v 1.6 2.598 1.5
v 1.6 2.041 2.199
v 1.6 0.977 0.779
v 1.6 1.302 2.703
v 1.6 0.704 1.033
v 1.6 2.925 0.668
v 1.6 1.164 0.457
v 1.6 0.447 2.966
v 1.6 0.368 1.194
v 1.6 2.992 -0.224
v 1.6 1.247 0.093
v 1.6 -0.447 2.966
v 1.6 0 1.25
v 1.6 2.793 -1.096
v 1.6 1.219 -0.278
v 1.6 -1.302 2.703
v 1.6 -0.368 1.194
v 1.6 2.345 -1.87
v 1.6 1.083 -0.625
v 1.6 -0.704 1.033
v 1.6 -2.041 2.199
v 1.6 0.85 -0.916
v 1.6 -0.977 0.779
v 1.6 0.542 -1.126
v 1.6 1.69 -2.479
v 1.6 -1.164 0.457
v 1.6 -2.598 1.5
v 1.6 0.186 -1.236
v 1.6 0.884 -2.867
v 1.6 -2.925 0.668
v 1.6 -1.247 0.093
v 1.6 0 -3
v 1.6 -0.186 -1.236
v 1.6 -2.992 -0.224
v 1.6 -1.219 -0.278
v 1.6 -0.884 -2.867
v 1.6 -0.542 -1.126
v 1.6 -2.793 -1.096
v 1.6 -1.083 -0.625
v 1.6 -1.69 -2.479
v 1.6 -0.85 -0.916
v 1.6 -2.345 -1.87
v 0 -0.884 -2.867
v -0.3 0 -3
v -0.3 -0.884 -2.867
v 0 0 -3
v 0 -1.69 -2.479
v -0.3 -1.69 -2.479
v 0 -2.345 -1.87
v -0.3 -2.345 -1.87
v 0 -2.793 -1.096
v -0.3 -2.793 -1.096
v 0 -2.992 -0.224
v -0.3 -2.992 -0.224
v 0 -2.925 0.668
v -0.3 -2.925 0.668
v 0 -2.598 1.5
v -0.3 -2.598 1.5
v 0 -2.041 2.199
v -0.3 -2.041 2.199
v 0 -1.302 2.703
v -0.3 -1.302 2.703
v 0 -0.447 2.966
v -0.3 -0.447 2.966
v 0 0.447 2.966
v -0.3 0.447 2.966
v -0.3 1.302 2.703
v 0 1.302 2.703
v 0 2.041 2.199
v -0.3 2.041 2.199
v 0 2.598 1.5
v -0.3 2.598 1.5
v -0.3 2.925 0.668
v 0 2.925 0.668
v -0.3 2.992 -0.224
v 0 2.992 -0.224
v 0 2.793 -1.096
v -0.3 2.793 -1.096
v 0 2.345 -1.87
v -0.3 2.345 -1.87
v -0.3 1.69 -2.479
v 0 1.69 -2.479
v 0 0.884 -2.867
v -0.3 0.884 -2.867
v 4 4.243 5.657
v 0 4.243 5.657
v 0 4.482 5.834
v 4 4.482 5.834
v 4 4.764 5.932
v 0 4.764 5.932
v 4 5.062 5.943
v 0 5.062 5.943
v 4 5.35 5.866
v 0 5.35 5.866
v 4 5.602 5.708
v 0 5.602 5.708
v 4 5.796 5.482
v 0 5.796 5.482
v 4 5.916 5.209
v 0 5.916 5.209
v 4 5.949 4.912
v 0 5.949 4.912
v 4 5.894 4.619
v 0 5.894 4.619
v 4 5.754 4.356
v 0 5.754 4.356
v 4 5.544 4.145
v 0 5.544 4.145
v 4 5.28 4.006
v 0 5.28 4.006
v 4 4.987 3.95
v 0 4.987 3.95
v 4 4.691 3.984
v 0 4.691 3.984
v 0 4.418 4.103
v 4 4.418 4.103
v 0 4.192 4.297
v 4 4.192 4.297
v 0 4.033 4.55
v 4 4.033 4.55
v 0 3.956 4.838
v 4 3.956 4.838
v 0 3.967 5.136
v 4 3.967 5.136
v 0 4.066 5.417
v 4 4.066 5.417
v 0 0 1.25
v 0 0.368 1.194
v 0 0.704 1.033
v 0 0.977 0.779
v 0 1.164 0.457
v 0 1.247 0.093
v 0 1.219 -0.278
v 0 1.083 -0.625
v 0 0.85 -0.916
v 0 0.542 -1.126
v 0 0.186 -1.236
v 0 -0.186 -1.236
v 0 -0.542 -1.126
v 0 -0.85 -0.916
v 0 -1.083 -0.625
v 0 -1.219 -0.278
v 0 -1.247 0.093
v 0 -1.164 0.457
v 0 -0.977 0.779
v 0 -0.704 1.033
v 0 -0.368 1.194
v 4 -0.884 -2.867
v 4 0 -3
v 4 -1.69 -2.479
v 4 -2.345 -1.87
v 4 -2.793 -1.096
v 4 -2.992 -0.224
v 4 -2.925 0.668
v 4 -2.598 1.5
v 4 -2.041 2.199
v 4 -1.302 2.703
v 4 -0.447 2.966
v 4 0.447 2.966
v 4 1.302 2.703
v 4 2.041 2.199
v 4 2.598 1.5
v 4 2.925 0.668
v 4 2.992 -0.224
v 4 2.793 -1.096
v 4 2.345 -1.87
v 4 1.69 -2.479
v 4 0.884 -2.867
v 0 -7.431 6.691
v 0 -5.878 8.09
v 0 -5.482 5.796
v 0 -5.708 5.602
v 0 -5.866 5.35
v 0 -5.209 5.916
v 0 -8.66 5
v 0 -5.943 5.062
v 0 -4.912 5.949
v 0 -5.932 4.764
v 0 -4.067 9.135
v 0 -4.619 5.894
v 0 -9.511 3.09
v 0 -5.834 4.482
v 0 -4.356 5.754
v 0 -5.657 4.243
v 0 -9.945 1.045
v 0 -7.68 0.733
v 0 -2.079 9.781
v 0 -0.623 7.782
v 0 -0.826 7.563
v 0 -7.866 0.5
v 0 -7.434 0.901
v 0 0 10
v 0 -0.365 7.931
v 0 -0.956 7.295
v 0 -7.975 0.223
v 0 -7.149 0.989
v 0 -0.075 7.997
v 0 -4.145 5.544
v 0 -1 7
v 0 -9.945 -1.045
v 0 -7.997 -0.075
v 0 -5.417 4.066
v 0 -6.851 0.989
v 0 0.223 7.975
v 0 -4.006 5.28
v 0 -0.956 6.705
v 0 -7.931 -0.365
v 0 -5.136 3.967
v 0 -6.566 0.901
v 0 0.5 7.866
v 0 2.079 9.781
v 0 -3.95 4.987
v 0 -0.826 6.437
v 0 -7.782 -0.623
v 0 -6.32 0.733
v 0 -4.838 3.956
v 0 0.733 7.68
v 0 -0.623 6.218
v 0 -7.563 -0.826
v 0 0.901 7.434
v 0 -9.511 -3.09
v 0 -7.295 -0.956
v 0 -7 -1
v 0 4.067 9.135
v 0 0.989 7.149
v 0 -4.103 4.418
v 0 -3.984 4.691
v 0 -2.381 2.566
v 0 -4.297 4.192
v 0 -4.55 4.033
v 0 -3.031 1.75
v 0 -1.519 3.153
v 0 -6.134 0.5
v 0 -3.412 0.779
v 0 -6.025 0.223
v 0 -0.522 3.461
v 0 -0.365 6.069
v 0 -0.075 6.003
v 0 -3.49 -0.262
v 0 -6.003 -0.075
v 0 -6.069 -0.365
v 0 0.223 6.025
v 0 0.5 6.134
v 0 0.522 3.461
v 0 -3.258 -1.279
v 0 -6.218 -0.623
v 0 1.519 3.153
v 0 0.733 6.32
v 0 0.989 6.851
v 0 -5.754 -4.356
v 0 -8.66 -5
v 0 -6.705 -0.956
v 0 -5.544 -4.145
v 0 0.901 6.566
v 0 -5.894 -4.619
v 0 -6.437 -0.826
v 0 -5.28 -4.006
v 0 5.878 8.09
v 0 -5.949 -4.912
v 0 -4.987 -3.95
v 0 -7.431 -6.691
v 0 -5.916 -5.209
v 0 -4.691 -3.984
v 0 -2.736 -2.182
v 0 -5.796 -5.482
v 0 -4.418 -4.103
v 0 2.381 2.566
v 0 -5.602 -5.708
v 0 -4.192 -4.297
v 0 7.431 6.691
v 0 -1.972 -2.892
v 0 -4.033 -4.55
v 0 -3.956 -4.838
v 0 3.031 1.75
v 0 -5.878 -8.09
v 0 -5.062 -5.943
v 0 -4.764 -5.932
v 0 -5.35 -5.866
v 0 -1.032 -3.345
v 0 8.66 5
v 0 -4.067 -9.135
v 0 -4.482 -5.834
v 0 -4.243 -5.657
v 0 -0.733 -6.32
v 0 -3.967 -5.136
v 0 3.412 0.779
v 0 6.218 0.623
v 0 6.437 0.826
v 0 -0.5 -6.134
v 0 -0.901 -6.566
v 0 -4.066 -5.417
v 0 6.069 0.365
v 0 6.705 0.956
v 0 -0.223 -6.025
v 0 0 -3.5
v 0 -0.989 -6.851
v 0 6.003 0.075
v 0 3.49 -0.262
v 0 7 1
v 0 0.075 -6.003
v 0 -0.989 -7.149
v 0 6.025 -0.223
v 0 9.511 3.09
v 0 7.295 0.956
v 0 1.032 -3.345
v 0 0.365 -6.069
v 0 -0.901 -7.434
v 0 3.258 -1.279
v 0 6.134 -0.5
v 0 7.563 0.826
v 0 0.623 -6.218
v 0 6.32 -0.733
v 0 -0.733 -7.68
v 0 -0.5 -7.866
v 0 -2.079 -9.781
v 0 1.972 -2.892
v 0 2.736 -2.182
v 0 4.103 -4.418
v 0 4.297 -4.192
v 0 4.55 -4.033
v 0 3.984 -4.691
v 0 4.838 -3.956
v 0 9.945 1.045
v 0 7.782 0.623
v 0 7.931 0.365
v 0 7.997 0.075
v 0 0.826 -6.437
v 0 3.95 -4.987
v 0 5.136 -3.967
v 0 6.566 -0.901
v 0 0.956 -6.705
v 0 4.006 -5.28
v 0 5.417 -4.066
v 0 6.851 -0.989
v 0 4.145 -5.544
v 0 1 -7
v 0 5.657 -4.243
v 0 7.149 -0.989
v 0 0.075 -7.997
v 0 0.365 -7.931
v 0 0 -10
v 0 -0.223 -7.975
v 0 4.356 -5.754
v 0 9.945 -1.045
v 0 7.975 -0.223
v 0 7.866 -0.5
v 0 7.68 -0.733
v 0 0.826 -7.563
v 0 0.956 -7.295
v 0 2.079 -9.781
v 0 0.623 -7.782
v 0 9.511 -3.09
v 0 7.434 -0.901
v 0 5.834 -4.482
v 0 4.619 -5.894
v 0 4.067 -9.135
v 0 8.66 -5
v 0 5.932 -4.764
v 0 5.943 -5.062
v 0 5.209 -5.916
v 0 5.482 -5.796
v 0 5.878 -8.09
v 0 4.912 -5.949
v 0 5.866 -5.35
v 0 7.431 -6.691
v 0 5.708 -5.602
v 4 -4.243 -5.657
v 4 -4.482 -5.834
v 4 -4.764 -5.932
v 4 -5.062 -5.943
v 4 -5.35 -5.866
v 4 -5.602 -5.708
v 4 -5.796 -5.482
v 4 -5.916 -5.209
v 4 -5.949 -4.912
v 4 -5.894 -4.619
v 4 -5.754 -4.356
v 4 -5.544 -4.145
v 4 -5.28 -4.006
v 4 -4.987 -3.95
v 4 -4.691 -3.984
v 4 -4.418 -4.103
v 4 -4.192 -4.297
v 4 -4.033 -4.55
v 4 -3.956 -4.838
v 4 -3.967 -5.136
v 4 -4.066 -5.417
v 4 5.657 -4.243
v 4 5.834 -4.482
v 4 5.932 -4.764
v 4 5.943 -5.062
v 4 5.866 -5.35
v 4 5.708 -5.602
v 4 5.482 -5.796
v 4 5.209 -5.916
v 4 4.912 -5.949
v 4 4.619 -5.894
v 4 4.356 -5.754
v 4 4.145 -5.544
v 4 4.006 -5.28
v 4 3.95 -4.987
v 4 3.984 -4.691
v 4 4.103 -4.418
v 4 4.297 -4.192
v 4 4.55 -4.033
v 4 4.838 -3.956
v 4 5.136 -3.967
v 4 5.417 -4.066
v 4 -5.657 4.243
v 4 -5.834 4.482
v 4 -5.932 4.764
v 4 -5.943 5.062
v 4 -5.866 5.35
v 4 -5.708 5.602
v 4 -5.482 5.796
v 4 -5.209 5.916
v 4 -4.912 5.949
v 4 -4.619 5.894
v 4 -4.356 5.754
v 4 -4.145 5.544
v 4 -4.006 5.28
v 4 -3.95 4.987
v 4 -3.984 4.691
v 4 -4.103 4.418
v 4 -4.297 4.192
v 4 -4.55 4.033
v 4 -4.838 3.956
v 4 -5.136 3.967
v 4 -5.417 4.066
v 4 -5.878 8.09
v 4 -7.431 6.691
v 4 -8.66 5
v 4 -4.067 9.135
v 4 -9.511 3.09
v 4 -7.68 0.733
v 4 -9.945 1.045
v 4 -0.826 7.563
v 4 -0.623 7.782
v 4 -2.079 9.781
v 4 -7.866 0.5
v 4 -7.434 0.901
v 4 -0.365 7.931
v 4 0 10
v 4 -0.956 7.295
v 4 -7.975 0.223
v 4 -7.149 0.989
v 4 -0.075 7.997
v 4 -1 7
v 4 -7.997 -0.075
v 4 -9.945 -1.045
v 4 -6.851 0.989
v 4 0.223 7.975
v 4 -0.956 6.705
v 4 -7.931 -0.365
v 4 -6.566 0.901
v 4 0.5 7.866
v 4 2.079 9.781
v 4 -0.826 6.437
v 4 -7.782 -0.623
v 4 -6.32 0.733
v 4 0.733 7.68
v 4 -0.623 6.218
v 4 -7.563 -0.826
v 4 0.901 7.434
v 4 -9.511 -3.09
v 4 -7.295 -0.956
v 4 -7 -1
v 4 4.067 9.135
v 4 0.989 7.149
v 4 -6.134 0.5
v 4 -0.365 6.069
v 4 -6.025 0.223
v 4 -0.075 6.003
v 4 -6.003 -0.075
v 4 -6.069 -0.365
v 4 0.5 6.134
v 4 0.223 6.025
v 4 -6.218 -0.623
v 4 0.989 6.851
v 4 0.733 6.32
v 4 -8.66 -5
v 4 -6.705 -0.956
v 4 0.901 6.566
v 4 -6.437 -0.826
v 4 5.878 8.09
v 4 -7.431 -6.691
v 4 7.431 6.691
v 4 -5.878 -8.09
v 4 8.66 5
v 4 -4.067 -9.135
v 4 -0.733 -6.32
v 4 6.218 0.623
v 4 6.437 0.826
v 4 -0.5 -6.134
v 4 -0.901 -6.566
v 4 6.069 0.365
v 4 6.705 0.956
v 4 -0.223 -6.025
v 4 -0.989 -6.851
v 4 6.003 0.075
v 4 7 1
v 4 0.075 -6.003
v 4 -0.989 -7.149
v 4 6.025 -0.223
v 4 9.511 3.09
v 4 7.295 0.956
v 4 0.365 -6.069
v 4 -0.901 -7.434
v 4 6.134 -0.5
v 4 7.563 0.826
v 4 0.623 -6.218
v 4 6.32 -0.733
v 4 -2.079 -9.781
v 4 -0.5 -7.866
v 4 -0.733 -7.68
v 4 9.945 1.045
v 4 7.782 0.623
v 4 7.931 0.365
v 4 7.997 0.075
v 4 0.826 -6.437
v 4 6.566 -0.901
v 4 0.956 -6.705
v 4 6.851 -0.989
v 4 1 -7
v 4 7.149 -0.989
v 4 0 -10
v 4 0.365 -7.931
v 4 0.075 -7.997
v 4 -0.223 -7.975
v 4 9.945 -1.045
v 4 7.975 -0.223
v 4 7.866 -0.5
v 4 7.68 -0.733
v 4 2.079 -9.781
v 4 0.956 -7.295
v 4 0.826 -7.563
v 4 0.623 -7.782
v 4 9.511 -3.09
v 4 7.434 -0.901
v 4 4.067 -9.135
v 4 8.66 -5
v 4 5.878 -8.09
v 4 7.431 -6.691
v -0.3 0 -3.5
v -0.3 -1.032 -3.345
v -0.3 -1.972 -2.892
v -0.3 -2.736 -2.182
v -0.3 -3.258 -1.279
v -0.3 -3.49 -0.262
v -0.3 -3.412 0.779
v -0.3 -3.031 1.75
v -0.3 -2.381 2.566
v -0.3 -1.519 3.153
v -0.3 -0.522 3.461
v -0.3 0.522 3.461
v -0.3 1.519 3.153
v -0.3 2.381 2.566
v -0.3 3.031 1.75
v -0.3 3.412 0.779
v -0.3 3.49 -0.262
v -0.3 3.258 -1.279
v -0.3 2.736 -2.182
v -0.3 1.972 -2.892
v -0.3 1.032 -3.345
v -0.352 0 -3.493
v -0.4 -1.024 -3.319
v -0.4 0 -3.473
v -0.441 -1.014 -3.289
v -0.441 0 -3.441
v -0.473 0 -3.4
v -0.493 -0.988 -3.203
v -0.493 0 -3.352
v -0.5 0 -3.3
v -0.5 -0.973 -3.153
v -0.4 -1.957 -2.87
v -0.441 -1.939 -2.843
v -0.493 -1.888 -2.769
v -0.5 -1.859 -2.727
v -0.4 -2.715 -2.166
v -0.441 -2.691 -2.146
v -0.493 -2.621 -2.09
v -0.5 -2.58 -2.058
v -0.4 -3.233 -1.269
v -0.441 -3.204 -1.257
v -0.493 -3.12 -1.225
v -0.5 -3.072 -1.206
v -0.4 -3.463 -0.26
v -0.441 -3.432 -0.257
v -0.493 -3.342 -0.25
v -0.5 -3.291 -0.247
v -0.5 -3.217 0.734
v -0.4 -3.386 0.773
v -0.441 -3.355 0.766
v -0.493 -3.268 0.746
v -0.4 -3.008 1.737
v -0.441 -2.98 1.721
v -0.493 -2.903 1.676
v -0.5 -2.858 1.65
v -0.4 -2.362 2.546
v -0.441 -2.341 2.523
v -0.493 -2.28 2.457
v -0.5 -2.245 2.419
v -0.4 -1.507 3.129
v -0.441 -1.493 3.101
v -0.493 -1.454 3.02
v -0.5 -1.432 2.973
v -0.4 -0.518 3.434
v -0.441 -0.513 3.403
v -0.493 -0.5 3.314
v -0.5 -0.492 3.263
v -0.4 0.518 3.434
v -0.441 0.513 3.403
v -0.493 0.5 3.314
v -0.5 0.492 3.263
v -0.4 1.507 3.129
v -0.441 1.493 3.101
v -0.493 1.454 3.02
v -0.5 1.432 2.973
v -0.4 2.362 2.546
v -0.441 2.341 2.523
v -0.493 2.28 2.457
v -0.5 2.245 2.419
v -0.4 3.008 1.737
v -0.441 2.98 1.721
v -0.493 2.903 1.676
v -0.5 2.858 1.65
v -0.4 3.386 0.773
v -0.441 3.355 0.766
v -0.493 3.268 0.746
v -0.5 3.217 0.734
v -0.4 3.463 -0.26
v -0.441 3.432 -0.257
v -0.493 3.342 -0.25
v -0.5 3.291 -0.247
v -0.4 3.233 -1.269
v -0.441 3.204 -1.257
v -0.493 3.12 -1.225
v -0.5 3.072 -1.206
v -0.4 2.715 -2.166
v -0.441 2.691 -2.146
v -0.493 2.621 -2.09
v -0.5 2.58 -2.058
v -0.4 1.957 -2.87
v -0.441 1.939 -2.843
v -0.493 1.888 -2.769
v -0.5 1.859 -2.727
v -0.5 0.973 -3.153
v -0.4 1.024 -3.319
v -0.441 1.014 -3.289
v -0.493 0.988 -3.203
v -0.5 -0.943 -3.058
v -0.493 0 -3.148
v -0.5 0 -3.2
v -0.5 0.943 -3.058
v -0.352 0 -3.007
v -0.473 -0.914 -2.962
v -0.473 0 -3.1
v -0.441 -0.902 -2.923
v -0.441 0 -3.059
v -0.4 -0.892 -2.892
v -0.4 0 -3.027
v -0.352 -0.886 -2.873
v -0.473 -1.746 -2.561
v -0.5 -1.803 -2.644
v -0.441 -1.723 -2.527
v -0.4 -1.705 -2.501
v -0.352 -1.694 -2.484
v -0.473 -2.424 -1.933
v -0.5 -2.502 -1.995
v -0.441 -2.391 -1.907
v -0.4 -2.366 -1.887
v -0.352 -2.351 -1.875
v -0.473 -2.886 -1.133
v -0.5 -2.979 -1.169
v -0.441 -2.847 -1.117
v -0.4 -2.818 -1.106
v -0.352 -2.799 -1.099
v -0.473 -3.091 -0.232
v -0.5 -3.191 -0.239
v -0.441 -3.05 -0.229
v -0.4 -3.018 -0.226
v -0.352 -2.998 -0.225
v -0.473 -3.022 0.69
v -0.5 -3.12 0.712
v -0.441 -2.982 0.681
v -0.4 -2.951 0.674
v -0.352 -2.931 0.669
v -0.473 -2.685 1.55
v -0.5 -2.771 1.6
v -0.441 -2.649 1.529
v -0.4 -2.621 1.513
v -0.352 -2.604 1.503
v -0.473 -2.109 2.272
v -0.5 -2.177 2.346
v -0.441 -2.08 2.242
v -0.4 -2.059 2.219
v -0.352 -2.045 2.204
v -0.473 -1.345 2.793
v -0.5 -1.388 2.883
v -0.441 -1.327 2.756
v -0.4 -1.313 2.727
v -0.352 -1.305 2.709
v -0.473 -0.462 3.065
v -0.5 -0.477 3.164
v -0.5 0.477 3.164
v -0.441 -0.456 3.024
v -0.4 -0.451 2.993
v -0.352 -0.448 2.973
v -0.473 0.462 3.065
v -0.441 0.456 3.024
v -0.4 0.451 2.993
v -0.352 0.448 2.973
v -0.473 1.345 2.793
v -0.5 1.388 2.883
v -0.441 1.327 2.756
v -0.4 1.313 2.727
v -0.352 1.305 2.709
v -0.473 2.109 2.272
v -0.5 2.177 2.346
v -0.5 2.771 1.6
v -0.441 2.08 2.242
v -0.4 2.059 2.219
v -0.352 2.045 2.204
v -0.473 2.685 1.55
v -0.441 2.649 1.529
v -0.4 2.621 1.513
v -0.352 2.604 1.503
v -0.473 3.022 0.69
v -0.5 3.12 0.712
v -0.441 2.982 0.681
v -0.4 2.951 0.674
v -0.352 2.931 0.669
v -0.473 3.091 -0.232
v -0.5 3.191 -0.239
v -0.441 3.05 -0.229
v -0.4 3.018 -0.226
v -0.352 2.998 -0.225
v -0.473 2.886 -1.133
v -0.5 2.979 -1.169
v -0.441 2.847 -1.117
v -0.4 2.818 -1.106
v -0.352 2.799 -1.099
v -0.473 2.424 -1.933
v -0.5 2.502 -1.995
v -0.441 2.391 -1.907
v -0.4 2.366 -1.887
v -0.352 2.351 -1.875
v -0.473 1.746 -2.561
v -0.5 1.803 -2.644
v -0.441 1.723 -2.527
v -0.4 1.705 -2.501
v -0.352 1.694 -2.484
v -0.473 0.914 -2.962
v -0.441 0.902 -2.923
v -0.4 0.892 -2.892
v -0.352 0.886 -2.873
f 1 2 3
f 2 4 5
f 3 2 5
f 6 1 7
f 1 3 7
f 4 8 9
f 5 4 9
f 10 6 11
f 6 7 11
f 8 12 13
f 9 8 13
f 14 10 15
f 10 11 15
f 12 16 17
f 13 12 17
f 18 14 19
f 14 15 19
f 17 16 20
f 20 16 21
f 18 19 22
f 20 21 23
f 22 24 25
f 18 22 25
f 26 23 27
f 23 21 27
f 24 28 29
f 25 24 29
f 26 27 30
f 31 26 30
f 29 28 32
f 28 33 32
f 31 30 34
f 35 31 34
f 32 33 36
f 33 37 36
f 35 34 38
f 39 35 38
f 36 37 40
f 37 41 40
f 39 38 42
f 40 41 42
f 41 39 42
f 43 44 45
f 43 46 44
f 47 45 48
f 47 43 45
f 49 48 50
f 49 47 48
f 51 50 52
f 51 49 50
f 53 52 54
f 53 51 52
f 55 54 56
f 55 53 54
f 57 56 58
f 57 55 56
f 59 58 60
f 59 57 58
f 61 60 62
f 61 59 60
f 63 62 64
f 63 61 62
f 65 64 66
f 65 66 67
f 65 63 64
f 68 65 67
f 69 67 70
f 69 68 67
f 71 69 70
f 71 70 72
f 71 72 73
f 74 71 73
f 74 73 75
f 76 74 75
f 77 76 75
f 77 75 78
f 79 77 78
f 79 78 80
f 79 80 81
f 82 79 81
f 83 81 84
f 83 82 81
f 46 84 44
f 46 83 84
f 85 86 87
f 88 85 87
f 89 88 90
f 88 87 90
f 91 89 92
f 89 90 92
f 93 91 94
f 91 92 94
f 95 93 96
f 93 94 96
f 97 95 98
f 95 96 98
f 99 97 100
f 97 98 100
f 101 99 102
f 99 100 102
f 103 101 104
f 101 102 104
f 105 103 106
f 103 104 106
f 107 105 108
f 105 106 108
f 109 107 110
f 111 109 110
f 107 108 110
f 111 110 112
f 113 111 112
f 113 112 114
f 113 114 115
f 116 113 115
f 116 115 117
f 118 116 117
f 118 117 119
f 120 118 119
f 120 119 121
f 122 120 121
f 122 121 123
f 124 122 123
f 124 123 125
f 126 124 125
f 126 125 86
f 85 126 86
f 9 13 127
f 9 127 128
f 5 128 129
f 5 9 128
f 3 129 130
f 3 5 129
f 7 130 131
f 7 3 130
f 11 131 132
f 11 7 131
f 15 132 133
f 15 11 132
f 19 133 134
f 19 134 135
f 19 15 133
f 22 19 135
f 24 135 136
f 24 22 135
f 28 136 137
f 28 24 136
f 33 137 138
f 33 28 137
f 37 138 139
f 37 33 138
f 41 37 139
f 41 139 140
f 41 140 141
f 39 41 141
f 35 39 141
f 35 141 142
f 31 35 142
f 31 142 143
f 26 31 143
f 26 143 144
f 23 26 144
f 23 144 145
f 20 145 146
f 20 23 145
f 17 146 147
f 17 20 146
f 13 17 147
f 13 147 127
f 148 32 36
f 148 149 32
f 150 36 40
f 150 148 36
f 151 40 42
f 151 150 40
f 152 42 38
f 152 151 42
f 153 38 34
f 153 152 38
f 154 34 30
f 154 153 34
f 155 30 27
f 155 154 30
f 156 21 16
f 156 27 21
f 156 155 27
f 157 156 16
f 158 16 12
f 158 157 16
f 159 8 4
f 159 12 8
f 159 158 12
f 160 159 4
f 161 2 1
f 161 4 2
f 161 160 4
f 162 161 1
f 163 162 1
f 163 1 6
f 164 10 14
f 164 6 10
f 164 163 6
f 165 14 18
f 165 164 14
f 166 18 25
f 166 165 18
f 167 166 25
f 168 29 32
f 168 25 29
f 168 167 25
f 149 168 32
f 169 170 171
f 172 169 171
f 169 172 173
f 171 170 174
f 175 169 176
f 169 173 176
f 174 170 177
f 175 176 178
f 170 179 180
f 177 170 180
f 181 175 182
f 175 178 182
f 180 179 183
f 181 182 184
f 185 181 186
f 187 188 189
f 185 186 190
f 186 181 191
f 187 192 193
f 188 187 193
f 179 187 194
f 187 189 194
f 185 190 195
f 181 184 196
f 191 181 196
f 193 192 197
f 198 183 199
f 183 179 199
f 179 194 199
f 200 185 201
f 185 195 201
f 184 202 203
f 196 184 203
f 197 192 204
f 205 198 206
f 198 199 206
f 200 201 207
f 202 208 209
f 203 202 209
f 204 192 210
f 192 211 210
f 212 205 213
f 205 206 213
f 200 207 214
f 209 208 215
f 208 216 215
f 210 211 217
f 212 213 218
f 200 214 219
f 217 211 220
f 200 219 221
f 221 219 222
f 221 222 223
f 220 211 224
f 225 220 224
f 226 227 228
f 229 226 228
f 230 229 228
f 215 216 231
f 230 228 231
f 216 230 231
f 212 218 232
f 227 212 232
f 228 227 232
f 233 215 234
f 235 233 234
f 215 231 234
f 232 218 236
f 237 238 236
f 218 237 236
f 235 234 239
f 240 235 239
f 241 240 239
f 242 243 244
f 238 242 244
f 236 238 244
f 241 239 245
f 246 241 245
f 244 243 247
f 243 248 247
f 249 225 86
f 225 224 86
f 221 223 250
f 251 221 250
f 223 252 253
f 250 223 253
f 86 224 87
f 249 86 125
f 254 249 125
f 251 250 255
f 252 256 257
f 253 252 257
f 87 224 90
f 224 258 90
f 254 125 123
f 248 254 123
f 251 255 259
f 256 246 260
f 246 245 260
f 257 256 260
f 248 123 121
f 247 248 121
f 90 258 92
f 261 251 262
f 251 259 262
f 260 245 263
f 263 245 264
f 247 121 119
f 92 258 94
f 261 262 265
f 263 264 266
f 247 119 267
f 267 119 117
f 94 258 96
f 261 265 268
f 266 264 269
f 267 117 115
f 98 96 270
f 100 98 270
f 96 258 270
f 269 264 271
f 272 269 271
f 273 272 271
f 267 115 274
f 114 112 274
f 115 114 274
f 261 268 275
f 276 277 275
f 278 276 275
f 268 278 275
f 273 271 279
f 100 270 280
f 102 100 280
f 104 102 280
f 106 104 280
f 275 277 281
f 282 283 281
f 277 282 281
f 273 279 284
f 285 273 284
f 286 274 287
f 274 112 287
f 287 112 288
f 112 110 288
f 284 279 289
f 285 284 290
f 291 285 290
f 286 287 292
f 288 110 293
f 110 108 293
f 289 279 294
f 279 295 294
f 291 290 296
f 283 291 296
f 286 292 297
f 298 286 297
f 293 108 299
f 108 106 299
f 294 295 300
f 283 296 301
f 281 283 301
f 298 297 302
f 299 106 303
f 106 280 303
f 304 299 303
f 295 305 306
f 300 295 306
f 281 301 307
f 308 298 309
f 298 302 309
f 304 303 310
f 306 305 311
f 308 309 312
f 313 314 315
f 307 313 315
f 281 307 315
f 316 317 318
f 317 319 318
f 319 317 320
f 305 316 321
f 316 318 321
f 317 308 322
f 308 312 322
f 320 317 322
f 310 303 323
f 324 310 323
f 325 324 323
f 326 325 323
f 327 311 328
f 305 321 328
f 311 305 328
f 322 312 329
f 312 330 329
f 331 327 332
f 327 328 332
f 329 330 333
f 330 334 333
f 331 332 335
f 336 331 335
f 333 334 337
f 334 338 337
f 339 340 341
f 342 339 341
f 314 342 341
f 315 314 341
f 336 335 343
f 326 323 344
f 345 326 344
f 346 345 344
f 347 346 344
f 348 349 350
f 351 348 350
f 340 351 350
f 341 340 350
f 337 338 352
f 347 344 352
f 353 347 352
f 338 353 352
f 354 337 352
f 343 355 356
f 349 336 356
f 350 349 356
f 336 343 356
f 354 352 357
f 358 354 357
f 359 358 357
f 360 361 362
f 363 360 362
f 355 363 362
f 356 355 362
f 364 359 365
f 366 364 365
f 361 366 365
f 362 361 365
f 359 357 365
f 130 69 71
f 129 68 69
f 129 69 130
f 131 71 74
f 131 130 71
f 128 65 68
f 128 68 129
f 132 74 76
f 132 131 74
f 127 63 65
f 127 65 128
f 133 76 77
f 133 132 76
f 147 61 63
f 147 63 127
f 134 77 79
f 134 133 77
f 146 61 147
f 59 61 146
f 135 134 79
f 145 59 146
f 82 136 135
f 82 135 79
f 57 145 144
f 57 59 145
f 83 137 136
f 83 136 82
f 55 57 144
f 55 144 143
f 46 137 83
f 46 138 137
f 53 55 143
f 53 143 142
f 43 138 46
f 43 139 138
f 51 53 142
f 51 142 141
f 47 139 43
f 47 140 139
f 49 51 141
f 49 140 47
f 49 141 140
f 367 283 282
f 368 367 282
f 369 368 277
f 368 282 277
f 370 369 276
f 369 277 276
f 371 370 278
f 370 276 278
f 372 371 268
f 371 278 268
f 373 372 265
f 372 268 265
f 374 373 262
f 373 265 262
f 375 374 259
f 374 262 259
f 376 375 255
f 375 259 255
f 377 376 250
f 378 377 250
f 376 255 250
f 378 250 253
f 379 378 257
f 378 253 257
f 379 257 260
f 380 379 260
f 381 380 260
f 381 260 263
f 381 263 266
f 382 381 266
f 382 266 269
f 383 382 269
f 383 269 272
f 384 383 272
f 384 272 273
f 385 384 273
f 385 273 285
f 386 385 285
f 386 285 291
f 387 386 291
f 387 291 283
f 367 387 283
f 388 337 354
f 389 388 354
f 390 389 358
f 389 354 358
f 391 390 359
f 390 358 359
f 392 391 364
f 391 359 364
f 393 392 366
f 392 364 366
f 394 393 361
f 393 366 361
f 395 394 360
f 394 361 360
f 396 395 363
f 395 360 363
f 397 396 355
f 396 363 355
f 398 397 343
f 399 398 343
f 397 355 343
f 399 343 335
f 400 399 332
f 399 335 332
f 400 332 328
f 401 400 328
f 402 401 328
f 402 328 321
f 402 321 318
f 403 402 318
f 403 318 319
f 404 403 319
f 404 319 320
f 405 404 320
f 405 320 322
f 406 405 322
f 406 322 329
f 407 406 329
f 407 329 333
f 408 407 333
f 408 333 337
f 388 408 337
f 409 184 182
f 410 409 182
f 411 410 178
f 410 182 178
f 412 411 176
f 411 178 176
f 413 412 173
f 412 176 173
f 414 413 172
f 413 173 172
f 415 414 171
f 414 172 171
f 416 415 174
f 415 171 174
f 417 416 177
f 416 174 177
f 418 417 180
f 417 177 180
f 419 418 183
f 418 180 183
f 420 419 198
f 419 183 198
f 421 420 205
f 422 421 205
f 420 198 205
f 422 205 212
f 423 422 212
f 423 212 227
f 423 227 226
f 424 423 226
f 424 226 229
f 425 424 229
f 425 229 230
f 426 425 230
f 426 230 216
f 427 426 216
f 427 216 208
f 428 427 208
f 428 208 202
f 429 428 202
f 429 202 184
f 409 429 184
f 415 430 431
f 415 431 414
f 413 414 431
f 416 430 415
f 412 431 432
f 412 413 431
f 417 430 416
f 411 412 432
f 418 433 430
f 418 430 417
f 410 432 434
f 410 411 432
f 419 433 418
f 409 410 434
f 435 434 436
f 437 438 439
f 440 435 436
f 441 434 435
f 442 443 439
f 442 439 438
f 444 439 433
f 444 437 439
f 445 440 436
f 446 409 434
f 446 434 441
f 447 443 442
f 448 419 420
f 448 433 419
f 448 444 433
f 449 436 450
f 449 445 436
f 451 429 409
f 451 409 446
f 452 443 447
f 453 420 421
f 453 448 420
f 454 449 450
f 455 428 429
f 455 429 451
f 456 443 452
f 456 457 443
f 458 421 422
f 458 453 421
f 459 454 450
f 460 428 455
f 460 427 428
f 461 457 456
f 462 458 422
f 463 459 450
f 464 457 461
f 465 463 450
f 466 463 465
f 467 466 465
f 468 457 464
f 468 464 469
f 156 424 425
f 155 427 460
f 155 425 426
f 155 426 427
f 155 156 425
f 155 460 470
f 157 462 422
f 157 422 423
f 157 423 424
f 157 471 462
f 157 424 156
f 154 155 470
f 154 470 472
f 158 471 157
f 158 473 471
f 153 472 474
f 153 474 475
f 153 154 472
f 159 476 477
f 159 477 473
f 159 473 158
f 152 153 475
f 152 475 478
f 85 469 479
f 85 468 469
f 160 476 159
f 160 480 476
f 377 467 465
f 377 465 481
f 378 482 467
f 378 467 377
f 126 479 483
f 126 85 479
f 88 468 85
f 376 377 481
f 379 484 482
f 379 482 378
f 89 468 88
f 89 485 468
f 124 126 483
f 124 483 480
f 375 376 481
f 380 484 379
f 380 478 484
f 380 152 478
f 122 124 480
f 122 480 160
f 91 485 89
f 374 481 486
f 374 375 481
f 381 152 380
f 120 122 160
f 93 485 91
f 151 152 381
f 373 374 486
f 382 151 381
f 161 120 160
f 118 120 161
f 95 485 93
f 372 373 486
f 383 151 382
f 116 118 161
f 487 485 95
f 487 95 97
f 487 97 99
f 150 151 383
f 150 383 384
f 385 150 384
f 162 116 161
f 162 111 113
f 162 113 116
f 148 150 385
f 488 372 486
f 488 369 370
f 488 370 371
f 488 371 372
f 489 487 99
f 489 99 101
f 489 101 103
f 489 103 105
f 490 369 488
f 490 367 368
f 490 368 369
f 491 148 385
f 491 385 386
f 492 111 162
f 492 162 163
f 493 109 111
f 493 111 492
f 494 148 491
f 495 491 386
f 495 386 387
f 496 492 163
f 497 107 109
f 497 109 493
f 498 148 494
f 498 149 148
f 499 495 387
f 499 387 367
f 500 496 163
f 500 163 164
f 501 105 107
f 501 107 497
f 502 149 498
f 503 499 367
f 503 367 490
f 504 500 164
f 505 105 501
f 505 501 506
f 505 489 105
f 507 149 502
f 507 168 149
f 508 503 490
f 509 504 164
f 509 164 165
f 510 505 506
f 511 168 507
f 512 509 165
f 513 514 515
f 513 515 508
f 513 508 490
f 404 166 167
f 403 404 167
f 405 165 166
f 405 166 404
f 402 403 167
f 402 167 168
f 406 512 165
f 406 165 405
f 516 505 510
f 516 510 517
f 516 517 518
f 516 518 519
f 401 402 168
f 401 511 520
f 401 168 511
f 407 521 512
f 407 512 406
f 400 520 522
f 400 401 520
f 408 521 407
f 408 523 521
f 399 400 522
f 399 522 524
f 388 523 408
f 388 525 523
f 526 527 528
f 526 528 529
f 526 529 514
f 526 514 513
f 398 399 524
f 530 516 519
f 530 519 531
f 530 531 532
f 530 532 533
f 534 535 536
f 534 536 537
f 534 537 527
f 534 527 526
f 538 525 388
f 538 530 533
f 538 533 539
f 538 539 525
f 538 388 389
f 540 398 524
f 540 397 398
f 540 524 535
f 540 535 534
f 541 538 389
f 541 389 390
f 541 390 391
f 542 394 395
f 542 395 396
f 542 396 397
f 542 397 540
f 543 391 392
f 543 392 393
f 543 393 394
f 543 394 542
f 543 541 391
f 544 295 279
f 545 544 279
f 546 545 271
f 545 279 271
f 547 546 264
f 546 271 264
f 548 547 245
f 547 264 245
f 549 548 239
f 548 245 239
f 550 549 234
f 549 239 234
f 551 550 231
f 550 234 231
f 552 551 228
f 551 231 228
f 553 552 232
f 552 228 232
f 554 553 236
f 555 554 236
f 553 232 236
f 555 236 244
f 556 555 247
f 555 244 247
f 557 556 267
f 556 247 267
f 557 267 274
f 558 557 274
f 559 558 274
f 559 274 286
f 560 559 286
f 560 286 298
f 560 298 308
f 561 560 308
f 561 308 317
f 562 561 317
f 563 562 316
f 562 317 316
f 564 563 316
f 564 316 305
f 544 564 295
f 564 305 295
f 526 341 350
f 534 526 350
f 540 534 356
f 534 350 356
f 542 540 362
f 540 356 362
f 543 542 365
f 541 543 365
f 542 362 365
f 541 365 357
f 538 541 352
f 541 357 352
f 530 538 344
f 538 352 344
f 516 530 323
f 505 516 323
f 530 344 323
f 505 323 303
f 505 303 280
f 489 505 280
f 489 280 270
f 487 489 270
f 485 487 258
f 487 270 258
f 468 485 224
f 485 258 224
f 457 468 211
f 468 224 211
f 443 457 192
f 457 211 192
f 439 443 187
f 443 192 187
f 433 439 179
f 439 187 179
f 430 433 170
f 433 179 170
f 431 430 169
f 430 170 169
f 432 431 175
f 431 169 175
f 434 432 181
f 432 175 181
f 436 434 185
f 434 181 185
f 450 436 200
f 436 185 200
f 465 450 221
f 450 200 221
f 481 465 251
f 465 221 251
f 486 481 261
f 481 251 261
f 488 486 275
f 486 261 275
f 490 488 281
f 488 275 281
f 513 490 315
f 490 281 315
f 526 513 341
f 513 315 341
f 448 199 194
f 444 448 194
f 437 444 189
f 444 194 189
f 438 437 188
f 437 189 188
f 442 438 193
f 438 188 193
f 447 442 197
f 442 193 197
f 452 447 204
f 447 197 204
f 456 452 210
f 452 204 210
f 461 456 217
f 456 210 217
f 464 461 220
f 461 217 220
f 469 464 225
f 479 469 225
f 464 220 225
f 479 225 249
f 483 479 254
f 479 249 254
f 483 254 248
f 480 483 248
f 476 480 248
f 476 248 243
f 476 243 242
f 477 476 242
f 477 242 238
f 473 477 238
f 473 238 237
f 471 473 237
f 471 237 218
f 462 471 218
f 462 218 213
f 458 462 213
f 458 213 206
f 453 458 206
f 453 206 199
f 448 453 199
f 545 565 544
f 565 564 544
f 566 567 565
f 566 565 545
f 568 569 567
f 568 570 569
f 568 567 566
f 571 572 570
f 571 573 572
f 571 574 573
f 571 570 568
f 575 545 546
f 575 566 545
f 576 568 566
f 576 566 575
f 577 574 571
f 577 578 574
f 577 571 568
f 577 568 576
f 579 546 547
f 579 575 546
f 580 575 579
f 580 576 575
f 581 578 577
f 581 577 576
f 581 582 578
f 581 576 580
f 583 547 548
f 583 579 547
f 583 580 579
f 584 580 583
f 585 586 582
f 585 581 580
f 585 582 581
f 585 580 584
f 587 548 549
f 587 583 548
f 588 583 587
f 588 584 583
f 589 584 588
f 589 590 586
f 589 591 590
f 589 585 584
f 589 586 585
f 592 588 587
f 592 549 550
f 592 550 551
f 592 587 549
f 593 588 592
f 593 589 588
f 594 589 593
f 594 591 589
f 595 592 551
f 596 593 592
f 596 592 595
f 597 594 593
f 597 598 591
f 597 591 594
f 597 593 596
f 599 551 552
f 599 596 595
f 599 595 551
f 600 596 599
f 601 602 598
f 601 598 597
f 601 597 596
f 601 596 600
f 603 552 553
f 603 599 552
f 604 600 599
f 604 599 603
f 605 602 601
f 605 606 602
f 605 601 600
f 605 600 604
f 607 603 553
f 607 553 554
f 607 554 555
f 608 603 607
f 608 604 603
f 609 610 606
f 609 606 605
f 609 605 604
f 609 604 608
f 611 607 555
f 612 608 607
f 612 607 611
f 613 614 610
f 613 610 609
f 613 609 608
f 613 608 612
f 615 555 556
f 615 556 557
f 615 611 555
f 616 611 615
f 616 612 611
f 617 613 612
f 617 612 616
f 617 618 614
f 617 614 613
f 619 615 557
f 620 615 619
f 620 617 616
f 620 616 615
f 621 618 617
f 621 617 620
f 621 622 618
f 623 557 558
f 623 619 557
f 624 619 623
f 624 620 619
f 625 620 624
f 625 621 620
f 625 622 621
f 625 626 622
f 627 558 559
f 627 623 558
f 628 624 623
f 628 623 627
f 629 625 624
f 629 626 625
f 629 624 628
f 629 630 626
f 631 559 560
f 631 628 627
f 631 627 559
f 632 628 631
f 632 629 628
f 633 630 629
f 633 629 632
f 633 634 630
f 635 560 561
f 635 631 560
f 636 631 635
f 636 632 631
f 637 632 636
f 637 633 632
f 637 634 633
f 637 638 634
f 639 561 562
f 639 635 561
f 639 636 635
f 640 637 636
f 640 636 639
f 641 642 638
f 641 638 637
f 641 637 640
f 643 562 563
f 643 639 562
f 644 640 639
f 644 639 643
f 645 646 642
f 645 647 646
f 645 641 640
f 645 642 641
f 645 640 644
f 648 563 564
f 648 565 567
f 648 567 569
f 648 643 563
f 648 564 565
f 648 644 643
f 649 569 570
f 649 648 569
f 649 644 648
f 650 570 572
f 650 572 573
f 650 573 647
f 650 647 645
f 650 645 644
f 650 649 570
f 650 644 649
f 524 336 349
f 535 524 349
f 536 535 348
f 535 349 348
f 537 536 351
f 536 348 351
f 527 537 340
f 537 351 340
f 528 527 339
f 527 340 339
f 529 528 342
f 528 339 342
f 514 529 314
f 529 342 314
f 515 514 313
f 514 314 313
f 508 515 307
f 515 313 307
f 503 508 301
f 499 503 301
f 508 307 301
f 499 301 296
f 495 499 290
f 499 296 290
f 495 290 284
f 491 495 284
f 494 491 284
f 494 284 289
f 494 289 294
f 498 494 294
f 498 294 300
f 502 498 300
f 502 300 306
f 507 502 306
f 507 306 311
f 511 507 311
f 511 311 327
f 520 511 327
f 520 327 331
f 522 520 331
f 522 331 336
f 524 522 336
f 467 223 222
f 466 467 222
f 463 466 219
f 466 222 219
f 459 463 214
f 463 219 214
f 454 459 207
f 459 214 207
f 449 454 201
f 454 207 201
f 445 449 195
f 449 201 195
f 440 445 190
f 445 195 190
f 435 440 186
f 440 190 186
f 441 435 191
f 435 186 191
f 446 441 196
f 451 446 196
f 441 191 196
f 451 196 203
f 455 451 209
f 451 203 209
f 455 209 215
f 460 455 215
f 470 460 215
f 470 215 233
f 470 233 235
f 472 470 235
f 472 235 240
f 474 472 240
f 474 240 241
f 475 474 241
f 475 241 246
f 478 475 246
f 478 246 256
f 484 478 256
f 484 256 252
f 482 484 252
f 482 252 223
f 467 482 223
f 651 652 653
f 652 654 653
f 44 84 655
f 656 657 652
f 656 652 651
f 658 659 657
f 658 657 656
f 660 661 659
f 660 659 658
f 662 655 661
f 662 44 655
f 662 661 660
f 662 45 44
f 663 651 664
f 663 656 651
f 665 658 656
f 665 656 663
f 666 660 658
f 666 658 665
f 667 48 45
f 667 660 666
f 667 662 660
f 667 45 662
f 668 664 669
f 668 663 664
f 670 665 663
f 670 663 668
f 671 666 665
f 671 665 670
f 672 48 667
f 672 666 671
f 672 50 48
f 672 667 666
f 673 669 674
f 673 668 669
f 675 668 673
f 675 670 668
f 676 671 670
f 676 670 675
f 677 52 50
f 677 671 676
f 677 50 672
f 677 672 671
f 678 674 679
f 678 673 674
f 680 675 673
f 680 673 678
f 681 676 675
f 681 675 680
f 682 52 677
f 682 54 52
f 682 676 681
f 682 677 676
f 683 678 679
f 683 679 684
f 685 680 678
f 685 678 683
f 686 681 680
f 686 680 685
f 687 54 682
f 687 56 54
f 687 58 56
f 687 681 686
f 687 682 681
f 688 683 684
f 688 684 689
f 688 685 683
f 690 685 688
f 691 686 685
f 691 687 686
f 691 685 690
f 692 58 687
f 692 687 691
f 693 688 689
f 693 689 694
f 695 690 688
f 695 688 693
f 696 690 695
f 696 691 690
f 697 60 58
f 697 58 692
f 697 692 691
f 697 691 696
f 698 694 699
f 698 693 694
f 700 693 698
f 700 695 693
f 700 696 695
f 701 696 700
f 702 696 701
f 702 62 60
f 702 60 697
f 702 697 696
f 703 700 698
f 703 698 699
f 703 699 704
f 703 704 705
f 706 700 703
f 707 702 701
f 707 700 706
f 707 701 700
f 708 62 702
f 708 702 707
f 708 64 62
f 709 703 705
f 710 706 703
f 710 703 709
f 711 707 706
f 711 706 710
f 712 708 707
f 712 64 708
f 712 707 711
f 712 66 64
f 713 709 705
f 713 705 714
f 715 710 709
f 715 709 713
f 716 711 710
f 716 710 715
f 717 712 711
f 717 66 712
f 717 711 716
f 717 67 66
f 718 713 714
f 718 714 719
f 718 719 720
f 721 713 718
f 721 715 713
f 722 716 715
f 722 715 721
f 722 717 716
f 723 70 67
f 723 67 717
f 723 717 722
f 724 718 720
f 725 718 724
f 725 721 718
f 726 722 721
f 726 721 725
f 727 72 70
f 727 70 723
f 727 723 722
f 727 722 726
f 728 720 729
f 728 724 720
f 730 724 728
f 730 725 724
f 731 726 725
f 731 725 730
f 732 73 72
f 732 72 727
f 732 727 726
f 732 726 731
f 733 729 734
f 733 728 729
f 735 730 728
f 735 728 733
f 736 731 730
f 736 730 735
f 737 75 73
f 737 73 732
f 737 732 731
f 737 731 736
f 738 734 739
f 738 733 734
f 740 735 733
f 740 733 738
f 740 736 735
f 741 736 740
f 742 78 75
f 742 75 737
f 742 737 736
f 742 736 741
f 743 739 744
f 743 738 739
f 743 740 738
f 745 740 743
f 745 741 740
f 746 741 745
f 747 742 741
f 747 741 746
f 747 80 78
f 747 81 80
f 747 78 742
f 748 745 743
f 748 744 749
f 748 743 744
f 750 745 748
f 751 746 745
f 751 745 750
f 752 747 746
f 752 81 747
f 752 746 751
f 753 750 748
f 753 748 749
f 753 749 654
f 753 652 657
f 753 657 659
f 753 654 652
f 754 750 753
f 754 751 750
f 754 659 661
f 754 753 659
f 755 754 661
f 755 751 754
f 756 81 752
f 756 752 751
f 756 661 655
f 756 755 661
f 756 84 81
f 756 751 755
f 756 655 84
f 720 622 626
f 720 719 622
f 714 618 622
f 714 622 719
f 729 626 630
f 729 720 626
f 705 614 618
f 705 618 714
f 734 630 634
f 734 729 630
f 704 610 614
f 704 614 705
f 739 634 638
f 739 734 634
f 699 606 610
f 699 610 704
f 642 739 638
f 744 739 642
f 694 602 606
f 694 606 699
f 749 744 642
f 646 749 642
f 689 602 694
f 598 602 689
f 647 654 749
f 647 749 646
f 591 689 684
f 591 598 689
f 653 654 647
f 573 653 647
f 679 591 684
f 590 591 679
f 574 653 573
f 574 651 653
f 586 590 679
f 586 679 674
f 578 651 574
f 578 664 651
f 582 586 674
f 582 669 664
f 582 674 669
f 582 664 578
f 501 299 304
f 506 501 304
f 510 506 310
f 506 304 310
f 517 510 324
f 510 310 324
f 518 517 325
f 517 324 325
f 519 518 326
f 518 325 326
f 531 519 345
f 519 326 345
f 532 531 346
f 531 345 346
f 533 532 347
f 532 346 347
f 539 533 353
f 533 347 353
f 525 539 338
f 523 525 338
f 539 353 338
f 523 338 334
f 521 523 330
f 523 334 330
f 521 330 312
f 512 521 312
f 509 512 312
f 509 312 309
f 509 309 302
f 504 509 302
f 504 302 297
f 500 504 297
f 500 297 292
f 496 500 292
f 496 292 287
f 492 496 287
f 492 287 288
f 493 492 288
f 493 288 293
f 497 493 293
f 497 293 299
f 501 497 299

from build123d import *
from build123d.topology import SkipClean

# Parameters (mm, degrees)
SKETCH_1_R               = 10
EXTRUDE_1_DEPTH          = 4
SKETCH_3_R               = 3
CUT_EXTRUDE_1_DEPTH      = 15.696938457
SKETCH_5_R               = 1
CUT_EXTRUDE_2_DEPTH      = 15.696938457
PATTERN_CIRCULAR_1_COUNT = 8
SKETCH_6_R               = 3.5
SKETCH_6_R_2             = 3
EXTRUDE_3_DEPTH          = 0.5
FILLET_3_R               = 0.2
EXTRUDE_START            = -1.6
SKETCH_7_R               = 3.5
SKETCH_7_R_2             = 1.25
EXTRUDE_4_DEPTH          = 1.6


with BuildPart() as part:
    # 草图1 → 凸台-拉伸1 (new body)
    with BuildSketch(Plane(origin=(0, 0, 0), x_dir=(0, 0, -1), z_dir=(1, 0, 0))):
        Circle(SKETCH_1_R)
    extrude(amount=EXTRUDE_1_DEPTH)

    # 草图3 → 切除-拉伸1 (cut, through all)
    with BuildSketch(Plane(origin=(4, 0, 0), x_dir=(0, 0, -1), z_dir=(1, 0, 0))):
        Circle(SKETCH_3_R)
    extrude(amount=-CUT_EXTRUDE_1_DEPTH, mode=Mode.SUBTRACT)

    # 草图5 → 切除-拉伸2 (cut, through all)
    with BuildSketch(Plane.ZY):
        with Locations((0, 7)):
            Circle(SKETCH_5_R)
    cut_extrude_2 = extrude(amount=-CUT_EXTRUDE_2_DEPTH, mode=Mode.SUBTRACT)

    # 阵列(圆周)1: 切除-拉伸2 ×8 about axis
    pattern_circular_1_axis = Axis((0, 0, 0), (1, 0, 0))
    for i in range(1, PATTERN_CIRCULAR_1_COUNT):
        add(cut_extrude_2.rotate(pattern_circular_1_axis, i * 360 / PATTERN_CIRCULAR_1_COUNT), mode=Mode.SUBTRACT)

    # 草图6 → 凸台-拉伸3 (add)
    with SkipClean():  # the faces are left unmerged after this step: merging them gives an invalid solid
        with BuildSketch(Plane.ZY):
            Circle(SKETCH_6_R)
            Circle(SKETCH_6_R_2, mode=Mode.SUBTRACT)
        extrude(amount=EXTRUDE_3_DEPTH)

    # 圆角3
    fillet_3_edges = [part.edges().sort_by_distance(p)[0] for p in [
        (-0.5, 0, -3),
        (-0.5, 0, -3.5),
    ]]
    fillet(fillet_3_edges, radius=FILLET_3_R)

    # 草图7 → 凸台-拉伸4 (add)
    with BuildSketch(Plane.ZY.offset(EXTRUDE_START)):
        Circle(SKETCH_7_R)
        Circle(SKETCH_7_R_2, mode=Mode.SUBTRACT)
    extrude(amount=EXTRUDE_4_DEPTH)


solid = part.part
